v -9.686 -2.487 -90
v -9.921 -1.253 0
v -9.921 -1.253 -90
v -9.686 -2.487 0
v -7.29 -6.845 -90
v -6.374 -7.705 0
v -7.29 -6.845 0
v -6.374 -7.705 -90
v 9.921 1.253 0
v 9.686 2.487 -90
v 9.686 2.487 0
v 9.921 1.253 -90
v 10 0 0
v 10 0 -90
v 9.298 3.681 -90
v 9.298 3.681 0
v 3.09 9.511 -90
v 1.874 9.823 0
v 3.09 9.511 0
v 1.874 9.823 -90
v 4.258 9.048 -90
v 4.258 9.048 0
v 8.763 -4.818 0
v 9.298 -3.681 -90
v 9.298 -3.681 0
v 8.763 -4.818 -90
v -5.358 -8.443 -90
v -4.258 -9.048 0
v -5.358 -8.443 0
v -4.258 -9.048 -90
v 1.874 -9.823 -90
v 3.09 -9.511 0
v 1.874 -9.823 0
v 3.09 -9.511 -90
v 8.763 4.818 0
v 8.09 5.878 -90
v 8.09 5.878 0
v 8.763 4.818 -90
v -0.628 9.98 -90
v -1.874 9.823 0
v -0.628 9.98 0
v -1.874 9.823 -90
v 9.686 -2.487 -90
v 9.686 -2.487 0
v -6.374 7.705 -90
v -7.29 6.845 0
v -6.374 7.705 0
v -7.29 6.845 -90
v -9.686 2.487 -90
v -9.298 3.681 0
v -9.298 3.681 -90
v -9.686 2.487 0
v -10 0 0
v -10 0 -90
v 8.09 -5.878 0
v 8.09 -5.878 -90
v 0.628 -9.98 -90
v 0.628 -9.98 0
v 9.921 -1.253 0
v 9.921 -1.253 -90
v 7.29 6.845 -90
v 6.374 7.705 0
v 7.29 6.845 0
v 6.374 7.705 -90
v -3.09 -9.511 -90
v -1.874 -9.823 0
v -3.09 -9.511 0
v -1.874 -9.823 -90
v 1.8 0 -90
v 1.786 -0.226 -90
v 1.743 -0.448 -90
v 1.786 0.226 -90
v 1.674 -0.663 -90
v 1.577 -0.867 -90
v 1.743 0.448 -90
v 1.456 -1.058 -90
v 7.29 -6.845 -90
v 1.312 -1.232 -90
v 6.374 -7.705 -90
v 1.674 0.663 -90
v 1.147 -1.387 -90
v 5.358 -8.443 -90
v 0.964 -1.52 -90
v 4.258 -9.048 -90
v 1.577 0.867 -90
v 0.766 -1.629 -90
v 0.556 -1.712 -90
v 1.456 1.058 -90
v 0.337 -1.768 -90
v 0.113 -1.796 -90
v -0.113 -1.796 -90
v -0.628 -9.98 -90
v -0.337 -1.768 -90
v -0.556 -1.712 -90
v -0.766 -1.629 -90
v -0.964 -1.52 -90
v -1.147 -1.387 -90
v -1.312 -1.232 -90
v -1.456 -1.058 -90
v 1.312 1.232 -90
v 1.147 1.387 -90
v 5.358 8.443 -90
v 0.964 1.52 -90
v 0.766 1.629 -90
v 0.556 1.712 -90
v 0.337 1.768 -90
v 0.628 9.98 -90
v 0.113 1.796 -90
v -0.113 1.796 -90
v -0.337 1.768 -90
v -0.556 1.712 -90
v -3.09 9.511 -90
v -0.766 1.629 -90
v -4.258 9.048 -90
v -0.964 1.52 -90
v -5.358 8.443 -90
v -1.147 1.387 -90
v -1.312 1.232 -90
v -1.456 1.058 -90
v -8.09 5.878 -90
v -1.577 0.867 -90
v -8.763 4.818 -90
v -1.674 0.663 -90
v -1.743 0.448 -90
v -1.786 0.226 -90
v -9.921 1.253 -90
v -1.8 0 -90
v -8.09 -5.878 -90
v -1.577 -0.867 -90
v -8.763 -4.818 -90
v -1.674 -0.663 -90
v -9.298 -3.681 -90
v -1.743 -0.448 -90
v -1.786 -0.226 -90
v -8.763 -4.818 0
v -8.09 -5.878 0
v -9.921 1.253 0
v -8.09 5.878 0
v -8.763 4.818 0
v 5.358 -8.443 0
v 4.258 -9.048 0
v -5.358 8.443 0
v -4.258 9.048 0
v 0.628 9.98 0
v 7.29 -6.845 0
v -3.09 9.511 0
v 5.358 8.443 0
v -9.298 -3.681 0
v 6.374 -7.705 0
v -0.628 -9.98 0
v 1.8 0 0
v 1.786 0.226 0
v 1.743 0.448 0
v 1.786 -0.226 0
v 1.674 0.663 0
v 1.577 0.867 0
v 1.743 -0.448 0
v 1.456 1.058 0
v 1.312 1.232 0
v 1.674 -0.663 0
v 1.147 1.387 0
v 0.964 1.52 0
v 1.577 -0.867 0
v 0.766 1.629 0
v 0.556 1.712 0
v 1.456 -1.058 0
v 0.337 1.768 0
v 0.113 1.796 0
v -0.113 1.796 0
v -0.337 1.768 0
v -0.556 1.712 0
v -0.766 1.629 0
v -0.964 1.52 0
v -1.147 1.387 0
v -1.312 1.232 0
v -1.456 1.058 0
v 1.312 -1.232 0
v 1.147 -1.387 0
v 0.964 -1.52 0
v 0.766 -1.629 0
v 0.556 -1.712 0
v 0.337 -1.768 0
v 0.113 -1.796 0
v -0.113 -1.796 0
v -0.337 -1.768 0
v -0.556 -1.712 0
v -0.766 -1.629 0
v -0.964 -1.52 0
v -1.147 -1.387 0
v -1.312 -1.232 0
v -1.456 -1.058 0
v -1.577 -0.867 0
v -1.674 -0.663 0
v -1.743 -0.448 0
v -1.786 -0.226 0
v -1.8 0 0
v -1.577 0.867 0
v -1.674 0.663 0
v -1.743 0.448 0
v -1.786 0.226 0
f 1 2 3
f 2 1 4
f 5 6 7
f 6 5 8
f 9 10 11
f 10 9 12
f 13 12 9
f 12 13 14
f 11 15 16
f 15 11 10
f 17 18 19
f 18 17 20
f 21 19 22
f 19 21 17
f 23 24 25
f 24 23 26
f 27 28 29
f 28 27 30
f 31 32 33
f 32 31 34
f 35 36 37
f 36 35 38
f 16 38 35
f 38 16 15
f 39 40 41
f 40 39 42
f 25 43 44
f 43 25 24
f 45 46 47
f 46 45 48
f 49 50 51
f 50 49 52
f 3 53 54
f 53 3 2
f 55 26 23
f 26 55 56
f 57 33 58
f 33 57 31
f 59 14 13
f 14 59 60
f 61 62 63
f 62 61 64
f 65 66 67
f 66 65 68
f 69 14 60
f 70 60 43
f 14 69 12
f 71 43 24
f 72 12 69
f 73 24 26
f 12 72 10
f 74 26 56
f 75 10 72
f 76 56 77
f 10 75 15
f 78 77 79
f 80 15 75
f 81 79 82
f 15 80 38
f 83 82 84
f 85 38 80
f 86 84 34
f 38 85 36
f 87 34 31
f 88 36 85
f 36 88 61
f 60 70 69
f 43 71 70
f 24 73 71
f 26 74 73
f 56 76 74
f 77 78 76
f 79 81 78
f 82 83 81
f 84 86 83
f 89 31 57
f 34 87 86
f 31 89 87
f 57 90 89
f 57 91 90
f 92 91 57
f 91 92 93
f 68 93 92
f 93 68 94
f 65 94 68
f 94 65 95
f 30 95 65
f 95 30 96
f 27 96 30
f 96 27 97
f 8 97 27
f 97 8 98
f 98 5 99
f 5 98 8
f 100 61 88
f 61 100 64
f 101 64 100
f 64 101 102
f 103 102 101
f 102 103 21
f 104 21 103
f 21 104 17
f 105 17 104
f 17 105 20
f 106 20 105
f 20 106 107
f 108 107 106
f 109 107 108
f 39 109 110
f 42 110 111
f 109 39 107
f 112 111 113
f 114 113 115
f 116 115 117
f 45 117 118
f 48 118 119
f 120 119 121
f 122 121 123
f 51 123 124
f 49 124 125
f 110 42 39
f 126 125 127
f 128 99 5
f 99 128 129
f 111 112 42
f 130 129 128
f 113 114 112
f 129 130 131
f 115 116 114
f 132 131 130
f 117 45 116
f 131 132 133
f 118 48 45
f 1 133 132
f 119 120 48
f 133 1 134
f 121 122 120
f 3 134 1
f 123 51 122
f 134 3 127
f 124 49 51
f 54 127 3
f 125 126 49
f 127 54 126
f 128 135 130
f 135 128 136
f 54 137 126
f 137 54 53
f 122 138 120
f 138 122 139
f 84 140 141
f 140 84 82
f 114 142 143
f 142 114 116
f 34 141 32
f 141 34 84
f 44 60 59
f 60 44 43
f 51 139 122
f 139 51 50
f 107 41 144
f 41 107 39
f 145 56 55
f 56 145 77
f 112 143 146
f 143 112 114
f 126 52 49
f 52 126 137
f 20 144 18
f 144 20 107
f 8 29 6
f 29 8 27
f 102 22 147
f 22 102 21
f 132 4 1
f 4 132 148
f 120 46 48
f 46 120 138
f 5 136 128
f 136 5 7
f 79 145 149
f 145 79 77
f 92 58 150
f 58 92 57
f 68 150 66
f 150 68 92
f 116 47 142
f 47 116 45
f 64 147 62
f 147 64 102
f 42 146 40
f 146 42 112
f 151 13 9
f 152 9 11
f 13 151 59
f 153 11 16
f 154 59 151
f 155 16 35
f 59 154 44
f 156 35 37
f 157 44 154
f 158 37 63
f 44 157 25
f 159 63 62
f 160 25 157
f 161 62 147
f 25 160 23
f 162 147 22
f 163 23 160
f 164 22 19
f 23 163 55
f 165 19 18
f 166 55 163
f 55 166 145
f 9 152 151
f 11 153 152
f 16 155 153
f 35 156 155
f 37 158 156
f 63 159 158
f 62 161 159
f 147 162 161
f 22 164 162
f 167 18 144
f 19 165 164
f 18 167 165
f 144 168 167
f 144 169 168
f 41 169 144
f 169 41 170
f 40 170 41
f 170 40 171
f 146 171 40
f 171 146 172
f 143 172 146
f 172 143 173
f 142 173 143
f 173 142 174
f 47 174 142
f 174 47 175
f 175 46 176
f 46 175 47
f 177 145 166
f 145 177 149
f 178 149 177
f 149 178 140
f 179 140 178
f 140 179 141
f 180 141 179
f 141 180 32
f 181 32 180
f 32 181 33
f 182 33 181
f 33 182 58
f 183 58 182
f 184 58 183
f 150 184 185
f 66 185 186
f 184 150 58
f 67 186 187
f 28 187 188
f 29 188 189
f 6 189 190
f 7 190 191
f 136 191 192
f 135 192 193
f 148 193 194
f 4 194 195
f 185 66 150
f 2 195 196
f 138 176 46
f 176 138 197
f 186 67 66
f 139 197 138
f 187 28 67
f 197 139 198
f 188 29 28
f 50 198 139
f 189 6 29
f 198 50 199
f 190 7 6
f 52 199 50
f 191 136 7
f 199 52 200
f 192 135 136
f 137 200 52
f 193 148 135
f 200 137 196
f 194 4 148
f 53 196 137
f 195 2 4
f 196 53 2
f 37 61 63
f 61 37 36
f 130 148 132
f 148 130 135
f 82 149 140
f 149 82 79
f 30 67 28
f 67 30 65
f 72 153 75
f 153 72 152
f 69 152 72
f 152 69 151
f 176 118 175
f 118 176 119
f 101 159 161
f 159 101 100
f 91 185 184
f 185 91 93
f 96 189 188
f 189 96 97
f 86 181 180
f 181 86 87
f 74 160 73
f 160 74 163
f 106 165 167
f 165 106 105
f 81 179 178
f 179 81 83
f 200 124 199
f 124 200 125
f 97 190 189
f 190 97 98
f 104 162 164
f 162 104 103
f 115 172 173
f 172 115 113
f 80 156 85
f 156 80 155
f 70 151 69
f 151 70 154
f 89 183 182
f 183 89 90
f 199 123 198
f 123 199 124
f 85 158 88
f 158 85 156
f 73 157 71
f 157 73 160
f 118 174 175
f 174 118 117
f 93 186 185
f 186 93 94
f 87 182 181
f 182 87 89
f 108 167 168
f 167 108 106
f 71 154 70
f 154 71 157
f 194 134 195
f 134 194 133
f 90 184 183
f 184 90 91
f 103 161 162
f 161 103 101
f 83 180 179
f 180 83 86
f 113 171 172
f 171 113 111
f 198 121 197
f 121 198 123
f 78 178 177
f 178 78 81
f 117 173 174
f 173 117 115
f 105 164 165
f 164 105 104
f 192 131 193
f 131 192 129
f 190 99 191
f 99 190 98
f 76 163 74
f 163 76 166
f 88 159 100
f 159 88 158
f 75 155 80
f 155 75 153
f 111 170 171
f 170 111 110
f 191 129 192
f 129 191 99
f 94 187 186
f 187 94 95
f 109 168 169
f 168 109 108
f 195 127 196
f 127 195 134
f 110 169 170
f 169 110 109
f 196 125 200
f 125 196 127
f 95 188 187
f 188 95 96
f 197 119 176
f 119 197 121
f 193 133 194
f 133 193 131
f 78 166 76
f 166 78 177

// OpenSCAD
$fn = 50;


difference() {
	union() {
		translate(v = [0, 0, -90.0000000000]) {
			cylinder(h = 90, r = 10.0000000000);
		}
		cylinder(h = 0, r = 16.0000000000);
	}
	union() {
		#translate(v = [0, 0, -90]) {
			cylinder(h = 90, r = 1.8000000000);
		}
	}
}
